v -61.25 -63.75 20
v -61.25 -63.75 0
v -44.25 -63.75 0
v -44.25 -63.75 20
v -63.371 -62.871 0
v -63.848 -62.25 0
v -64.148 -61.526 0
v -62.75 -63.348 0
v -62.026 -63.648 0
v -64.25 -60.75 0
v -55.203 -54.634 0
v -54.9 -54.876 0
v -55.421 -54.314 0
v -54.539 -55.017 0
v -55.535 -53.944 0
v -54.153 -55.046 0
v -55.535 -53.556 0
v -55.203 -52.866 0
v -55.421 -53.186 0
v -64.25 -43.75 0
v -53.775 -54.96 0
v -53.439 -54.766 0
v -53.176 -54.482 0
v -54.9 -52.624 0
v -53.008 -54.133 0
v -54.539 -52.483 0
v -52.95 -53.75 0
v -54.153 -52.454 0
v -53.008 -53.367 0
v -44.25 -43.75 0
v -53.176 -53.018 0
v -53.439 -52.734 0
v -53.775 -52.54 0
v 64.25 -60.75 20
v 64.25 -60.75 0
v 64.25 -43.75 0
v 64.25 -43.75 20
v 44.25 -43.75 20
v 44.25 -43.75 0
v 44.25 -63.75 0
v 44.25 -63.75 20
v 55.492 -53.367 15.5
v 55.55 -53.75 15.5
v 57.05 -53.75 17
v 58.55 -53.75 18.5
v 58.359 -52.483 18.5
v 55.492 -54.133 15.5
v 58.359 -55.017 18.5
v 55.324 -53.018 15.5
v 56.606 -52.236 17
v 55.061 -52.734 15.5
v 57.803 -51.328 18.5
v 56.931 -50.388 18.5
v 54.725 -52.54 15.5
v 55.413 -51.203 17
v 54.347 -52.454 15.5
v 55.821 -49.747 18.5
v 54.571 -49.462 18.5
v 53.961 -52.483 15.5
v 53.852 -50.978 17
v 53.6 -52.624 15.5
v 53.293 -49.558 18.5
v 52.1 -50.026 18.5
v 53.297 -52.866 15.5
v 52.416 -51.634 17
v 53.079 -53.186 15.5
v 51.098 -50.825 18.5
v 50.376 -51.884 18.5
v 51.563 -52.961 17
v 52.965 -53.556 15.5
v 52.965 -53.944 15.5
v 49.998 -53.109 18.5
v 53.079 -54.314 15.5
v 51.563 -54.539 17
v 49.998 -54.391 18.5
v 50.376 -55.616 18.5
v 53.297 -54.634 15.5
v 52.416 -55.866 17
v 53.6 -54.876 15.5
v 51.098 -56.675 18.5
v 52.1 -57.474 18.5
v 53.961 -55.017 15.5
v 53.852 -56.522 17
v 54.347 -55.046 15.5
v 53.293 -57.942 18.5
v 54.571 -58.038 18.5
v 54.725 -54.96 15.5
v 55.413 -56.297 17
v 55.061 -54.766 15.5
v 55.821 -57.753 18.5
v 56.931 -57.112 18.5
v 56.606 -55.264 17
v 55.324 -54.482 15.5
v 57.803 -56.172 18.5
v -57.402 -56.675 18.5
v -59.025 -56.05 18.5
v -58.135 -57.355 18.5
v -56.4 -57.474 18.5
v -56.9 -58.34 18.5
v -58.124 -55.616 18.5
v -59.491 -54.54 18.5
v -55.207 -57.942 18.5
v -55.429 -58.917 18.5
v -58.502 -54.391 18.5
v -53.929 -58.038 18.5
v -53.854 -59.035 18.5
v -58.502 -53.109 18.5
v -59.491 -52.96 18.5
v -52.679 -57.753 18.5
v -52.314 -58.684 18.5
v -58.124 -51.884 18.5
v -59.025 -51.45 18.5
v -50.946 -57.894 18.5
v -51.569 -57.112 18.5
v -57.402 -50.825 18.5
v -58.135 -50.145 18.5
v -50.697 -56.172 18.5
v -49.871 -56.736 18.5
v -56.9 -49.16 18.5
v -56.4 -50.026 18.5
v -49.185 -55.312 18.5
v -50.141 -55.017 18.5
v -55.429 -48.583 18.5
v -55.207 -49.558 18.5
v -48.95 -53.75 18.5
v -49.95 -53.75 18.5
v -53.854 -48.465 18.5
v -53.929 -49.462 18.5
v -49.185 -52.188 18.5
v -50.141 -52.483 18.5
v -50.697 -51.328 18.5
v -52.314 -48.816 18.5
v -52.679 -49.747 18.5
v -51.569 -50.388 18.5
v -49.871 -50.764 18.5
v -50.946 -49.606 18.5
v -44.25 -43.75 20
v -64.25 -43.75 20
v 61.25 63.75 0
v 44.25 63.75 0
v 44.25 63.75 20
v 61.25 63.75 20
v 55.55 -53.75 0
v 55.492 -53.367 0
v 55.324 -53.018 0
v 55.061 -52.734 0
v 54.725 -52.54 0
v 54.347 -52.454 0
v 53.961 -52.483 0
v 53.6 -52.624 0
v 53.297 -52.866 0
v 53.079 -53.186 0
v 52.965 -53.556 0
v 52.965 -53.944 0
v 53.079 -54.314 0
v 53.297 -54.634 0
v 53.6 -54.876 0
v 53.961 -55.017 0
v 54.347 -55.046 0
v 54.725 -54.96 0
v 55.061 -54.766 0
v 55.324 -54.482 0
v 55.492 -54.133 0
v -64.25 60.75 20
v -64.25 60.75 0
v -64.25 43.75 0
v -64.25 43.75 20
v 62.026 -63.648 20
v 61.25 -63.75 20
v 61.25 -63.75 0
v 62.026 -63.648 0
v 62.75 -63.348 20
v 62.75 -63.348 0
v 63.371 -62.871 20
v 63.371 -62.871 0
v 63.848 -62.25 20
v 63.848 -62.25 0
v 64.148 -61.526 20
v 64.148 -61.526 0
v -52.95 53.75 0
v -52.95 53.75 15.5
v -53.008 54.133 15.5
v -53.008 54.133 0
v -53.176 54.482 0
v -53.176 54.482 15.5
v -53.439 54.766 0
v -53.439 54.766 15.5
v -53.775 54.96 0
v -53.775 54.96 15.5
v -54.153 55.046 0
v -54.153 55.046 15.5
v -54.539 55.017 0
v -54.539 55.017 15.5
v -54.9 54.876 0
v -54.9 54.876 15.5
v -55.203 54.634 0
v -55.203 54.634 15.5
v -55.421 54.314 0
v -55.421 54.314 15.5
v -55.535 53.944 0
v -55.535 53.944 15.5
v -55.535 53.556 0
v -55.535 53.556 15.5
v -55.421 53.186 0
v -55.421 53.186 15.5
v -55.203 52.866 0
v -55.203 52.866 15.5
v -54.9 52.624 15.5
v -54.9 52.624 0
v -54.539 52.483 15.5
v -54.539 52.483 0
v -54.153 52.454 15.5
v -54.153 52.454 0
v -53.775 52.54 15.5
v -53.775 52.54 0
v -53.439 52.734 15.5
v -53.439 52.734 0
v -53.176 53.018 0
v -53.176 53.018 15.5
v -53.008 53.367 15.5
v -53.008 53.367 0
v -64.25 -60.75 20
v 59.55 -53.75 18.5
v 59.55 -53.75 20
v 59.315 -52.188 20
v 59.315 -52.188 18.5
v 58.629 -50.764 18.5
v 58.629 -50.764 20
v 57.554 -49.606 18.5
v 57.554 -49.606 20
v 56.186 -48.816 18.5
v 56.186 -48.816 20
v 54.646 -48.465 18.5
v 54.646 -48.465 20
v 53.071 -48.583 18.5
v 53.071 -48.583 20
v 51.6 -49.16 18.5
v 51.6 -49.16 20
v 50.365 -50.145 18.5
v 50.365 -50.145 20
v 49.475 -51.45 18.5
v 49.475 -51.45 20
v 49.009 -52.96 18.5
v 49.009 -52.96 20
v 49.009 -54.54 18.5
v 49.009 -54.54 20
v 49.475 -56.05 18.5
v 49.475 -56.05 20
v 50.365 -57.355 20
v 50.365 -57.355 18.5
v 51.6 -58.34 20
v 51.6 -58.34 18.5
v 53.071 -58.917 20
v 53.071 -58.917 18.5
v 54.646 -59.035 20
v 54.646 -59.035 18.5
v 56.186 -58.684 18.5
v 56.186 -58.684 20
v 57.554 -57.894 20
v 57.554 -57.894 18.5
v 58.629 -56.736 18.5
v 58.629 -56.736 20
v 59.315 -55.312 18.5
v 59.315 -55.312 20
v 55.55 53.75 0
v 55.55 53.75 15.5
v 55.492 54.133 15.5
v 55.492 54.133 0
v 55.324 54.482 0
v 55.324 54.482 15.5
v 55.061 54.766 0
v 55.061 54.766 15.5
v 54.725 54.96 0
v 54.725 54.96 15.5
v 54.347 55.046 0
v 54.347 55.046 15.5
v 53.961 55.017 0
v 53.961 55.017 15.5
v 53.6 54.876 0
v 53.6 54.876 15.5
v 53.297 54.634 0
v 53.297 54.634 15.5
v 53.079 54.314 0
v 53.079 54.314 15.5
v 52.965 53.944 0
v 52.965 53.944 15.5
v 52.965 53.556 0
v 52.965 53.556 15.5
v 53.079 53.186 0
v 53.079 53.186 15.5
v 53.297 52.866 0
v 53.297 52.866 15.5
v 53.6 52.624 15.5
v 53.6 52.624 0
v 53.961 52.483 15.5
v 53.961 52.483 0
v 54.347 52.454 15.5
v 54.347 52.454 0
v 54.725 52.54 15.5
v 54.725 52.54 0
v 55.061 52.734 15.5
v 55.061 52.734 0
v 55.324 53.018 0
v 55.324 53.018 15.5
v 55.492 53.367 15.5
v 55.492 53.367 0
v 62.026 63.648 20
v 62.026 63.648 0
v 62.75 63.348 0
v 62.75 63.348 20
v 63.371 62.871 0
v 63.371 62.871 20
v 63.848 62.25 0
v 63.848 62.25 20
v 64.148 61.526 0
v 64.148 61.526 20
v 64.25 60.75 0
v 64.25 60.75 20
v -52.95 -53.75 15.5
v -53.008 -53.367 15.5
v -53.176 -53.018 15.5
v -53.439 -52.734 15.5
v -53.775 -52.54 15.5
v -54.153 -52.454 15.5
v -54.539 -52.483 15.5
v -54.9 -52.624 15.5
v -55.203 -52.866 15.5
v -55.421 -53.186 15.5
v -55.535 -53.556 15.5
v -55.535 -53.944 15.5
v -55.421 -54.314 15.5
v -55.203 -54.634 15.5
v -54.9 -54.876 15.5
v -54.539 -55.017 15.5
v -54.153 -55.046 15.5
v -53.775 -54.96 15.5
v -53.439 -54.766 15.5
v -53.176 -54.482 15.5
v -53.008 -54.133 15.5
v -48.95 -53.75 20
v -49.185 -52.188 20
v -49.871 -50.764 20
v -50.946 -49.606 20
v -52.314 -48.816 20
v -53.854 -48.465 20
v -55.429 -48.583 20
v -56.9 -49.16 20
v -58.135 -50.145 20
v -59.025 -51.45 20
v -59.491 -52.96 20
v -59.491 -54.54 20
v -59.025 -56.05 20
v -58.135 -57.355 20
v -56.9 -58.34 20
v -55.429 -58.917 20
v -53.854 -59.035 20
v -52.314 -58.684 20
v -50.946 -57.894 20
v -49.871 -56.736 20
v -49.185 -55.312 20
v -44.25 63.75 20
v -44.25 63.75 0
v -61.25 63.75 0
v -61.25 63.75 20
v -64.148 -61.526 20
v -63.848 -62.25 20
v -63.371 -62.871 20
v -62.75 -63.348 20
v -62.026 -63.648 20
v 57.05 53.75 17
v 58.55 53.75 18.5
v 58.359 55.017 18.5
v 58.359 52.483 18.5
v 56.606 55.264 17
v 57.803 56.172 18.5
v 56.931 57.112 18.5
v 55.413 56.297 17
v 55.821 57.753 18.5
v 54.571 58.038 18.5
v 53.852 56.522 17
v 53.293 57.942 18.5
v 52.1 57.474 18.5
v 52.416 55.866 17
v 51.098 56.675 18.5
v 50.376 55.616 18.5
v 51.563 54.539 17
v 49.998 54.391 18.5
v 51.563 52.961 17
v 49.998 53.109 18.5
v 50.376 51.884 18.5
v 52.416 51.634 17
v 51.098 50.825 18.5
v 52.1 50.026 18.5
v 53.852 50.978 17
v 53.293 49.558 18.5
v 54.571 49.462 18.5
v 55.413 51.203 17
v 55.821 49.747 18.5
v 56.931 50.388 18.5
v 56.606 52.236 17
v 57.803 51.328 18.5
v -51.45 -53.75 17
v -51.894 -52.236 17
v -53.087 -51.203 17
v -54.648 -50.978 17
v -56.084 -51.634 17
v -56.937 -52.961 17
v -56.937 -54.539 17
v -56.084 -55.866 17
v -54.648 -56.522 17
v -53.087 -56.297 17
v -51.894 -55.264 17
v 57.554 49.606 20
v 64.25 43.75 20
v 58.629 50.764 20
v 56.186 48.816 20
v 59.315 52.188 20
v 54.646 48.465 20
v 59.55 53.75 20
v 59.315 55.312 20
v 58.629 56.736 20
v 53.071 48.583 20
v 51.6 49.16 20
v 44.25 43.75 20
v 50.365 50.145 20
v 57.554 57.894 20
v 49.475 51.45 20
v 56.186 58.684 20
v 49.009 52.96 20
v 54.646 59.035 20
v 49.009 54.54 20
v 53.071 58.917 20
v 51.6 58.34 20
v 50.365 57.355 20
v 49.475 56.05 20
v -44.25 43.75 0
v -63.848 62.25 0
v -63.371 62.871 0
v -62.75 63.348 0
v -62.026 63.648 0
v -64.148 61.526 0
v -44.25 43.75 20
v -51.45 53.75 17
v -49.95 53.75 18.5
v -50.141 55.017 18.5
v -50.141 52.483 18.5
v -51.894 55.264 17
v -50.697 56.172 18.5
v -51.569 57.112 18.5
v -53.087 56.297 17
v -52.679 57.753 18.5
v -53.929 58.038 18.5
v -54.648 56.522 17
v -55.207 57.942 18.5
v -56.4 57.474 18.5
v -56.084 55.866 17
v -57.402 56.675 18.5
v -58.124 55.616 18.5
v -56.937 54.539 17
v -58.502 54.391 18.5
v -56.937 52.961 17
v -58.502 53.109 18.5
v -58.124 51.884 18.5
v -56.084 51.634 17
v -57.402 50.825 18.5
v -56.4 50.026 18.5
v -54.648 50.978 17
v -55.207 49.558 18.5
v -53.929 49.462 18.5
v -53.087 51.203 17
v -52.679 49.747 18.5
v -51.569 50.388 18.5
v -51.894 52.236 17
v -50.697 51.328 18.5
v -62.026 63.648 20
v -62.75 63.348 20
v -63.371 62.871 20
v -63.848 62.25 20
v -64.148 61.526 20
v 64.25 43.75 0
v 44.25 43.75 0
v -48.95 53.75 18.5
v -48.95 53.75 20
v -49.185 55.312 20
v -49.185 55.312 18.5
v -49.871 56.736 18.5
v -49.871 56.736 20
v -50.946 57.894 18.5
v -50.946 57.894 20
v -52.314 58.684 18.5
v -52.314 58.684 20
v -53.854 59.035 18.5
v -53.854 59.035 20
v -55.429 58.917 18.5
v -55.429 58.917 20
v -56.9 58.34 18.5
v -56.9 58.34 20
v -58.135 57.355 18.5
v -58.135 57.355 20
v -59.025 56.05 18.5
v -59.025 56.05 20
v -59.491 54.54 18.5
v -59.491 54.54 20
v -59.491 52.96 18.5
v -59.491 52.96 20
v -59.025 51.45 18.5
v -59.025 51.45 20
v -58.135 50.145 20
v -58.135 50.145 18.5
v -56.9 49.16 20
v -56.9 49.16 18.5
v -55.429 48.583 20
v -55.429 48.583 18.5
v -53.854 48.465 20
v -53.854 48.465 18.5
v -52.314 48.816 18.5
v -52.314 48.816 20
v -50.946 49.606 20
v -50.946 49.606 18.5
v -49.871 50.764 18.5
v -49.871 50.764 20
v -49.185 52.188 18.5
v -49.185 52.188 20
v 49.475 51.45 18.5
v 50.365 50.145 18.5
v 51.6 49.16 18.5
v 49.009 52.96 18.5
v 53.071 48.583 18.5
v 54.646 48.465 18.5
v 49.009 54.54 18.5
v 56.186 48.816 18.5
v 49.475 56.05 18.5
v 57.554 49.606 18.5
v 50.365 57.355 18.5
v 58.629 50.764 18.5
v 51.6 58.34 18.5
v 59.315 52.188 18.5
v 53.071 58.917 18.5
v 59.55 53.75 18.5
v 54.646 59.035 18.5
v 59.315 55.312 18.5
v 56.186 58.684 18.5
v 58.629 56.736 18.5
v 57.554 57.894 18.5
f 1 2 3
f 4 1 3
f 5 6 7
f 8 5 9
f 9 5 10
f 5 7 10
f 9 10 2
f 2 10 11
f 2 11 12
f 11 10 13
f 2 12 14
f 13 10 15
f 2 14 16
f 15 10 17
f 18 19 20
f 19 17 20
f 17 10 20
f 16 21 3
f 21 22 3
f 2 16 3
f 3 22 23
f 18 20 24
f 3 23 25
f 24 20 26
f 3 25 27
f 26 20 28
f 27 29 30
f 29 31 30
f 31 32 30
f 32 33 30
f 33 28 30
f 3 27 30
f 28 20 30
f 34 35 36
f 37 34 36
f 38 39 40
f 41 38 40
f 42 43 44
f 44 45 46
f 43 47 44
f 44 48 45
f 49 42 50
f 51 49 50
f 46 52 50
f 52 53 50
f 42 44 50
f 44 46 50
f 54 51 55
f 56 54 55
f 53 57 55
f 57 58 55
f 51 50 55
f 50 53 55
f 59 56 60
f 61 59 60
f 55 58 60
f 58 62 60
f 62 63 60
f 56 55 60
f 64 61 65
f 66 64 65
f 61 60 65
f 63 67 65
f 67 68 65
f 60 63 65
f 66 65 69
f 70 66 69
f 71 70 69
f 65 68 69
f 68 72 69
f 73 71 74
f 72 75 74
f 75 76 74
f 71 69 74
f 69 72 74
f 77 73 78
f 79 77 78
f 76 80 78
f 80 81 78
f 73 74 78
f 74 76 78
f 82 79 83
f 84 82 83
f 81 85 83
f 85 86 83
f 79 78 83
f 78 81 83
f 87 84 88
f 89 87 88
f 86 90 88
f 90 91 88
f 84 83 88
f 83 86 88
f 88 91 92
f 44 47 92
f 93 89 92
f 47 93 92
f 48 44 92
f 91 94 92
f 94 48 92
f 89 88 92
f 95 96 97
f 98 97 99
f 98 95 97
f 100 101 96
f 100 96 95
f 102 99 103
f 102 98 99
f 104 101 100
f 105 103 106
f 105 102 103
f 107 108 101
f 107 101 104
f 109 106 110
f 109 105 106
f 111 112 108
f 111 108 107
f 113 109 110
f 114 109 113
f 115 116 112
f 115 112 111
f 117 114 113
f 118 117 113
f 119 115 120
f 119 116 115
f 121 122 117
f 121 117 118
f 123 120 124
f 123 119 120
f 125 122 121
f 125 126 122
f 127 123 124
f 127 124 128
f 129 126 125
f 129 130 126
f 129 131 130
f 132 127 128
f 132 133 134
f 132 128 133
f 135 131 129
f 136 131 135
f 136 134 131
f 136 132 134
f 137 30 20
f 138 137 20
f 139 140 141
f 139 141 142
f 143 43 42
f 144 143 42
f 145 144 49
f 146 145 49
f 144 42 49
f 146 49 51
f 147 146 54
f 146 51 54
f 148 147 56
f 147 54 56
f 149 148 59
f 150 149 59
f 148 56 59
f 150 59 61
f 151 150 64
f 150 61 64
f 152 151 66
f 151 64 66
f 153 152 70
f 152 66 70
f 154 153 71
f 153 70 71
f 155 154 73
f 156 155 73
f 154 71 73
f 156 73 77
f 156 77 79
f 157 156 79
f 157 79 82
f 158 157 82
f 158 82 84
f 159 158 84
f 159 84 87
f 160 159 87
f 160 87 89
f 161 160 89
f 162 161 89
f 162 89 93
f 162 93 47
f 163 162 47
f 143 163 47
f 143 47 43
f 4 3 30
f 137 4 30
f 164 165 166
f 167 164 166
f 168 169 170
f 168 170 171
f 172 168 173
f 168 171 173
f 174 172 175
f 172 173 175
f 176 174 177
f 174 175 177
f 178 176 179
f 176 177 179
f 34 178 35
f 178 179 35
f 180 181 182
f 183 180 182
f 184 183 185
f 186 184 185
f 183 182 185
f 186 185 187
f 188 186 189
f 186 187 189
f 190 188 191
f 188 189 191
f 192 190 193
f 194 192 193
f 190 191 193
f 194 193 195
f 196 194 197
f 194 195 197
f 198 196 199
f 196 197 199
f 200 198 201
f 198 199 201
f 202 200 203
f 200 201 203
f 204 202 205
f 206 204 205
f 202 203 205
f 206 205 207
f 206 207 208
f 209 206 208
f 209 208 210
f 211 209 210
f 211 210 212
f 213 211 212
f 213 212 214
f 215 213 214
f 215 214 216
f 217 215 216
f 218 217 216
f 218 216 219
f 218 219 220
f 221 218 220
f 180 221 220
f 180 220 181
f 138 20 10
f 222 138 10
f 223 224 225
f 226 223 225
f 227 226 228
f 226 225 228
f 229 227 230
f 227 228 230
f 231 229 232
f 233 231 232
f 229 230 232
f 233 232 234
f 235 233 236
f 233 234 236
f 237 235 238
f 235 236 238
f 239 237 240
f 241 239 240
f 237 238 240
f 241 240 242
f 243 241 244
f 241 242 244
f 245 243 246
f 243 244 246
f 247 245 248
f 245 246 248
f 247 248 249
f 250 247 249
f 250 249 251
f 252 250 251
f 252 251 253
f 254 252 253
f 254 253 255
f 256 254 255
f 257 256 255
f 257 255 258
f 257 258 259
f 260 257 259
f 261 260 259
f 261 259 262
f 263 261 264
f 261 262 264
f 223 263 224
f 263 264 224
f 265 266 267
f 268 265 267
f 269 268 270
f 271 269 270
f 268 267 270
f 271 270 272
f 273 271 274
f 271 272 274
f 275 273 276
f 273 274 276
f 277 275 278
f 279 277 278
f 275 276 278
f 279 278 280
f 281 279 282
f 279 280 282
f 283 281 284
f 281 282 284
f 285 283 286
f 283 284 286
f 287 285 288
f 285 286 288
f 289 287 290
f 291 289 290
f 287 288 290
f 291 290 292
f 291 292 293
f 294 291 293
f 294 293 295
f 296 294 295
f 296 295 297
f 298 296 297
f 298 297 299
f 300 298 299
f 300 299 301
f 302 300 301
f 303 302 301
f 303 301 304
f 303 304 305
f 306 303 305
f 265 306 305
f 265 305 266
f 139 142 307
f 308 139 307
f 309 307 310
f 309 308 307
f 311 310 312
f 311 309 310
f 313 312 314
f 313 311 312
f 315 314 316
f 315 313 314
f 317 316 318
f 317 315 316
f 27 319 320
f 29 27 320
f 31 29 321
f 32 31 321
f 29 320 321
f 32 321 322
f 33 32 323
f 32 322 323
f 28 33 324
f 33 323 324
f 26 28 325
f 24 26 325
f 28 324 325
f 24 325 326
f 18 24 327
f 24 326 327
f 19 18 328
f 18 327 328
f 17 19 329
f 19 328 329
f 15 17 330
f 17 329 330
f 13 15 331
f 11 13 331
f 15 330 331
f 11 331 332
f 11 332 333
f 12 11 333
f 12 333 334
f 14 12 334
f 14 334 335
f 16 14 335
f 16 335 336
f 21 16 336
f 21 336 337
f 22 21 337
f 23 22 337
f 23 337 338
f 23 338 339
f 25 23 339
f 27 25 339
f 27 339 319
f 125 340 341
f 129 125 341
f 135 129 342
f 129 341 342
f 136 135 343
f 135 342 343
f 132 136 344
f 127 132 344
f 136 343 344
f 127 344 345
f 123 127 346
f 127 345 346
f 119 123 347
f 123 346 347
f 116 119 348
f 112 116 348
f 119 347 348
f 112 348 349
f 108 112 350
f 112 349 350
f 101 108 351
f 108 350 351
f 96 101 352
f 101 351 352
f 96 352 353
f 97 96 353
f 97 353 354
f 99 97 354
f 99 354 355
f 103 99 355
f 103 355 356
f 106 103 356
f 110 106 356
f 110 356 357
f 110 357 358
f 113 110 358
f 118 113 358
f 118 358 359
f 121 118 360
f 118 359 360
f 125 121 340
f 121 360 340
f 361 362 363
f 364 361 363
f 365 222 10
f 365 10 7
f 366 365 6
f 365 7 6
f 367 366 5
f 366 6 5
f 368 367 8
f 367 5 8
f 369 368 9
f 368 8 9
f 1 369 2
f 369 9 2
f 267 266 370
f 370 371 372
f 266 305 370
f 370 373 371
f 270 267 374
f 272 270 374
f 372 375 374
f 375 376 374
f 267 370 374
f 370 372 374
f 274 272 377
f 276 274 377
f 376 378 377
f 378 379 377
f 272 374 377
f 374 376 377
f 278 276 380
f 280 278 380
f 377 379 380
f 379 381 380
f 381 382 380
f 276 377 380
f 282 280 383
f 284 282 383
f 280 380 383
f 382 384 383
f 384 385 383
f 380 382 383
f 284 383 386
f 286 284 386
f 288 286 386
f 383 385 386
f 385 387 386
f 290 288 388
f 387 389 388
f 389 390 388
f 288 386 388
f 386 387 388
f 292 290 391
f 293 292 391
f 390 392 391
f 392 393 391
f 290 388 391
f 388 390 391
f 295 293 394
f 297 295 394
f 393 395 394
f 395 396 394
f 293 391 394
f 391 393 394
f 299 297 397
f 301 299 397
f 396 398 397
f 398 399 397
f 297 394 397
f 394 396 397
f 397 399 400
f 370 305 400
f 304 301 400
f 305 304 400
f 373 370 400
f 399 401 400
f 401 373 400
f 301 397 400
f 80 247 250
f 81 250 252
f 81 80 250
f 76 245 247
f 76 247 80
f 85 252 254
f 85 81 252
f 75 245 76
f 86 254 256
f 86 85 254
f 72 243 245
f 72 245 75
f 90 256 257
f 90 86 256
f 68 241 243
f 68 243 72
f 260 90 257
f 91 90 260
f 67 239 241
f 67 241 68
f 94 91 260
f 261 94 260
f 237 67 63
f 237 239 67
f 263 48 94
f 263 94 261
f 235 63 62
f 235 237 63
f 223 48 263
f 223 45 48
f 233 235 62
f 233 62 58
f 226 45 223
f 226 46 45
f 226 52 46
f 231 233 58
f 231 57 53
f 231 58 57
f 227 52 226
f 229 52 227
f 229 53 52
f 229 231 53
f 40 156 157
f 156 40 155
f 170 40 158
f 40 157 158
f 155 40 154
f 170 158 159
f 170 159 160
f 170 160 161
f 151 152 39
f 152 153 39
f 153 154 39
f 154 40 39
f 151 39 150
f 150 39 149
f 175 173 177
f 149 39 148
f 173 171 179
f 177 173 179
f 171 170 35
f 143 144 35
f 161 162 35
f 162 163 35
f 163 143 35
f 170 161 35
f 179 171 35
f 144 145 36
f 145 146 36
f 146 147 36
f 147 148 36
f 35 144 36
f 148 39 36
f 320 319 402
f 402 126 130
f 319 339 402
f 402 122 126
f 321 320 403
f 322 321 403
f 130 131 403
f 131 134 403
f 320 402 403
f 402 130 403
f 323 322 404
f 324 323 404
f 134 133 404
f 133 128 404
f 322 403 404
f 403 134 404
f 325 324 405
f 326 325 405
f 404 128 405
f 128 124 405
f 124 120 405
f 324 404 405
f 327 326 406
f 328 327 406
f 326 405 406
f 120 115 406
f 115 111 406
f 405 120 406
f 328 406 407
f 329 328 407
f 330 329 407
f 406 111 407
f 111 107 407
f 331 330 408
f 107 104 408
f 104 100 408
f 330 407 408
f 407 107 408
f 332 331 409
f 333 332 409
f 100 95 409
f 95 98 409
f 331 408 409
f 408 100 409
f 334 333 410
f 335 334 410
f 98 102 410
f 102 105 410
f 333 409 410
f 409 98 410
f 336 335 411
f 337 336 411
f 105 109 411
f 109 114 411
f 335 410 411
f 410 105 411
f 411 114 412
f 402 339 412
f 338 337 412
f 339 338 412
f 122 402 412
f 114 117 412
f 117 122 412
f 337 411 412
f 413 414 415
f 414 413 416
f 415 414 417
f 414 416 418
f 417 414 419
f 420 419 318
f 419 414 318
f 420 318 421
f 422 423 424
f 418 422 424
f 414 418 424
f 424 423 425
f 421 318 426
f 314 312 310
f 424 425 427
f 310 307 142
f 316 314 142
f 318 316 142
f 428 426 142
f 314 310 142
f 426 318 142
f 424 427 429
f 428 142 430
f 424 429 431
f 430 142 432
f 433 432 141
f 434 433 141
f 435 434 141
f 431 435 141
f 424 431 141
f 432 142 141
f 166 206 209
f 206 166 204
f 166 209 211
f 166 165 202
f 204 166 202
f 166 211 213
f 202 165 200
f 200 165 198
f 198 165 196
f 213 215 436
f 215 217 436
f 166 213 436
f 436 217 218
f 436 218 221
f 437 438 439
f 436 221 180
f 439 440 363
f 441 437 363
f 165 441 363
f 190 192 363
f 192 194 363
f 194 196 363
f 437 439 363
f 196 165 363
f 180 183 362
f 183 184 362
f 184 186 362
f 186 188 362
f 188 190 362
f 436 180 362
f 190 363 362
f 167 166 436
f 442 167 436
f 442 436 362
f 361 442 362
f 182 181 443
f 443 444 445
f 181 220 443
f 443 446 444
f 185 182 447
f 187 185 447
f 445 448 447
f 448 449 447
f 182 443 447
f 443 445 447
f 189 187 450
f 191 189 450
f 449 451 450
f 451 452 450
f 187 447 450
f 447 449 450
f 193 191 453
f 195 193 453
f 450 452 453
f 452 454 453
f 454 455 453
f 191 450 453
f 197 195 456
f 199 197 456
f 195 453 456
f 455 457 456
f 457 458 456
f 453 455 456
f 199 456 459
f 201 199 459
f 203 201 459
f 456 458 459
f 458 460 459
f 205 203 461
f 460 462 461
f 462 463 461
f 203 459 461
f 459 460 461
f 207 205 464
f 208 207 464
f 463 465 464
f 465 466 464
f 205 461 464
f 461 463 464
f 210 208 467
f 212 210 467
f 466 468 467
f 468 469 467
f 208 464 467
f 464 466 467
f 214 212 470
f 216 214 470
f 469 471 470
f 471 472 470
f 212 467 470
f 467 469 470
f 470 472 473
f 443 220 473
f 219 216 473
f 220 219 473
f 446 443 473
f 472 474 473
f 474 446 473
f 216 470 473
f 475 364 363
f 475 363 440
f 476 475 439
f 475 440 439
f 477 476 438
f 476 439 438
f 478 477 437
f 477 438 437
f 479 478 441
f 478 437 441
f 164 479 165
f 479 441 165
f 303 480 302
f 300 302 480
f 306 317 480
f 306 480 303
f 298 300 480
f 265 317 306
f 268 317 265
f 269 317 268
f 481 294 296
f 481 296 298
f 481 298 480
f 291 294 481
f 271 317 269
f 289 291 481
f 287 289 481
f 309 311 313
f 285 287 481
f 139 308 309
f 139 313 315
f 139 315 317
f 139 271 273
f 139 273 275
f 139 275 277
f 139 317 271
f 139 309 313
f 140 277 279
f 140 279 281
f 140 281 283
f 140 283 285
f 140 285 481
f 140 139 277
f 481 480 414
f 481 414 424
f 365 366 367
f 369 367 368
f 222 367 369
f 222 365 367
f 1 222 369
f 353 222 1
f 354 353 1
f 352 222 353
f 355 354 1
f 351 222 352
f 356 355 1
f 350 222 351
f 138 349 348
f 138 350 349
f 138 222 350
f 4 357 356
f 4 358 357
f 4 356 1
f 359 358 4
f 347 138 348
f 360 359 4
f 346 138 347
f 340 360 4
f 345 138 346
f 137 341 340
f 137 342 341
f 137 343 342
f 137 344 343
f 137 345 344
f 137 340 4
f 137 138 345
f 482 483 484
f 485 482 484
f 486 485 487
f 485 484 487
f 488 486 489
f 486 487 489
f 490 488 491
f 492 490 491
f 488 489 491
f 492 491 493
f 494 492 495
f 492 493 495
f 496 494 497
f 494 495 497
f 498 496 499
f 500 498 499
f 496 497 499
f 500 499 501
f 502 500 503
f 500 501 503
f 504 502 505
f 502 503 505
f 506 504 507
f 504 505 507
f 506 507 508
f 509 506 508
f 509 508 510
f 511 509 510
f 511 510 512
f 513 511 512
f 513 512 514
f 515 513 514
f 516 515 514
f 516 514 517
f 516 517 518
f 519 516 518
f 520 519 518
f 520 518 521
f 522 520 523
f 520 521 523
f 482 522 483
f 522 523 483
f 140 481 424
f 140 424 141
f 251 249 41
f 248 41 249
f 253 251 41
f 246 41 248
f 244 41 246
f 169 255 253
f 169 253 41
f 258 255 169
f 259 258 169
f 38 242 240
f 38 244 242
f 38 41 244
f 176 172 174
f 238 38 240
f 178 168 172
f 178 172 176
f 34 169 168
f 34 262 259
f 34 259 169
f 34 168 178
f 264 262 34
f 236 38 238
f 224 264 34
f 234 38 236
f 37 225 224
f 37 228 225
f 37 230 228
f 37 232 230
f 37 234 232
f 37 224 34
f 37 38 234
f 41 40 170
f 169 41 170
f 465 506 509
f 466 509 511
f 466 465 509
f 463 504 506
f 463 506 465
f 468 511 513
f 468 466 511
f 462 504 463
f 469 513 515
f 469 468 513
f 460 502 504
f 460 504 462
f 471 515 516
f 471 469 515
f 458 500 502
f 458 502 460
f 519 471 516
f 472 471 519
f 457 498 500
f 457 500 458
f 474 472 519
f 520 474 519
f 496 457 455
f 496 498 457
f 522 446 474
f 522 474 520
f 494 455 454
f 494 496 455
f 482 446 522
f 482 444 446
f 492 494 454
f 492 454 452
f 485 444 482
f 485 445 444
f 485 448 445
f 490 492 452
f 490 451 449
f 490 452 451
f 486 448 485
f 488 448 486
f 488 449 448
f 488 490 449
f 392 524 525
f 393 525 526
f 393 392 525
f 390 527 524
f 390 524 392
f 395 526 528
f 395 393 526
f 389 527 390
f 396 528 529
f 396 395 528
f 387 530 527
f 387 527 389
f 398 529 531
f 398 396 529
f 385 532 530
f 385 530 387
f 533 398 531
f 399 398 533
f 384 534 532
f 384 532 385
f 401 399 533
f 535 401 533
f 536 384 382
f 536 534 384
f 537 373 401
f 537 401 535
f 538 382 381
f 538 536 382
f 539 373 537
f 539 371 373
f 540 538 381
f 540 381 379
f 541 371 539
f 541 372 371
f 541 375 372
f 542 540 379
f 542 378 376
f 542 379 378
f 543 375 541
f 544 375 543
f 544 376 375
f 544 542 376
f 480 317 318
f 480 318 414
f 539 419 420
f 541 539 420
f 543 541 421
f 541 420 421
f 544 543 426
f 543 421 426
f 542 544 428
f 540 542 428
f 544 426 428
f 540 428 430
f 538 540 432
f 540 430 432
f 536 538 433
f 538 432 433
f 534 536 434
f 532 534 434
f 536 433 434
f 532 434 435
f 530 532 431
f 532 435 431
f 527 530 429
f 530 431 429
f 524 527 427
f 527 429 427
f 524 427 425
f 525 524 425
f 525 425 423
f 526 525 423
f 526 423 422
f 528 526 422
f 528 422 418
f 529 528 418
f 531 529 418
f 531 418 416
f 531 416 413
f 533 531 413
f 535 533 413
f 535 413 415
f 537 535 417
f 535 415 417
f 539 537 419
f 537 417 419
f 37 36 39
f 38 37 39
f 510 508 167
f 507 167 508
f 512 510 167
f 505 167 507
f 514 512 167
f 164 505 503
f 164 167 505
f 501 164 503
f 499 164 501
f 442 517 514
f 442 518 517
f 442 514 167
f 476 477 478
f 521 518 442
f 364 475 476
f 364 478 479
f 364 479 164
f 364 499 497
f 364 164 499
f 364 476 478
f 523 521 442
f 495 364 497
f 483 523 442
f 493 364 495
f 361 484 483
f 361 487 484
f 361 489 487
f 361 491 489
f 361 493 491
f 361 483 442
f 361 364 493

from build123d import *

# Parameters (mm, degrees)
EXTRUDE_1_DEPTH     = 20
EXTRUDE_1_2_DEPTH   = 20
EXTRUDE_1_3_DEPTH   = 20
EXTRUDE_1_4_DEPTH   = 20
SKETCH_2_R          = 1.3
CUT_EXTRUDE_1_DEPTH = 21
SKETCH_3_R          = 5.3
CUT_EXTRUDE_2_DEPTH = 1.5
CHAMFER_1_SIZE      = 3
CHAMFER_2_SIZE      = 3
CHAMFER_3_SIZE      = 3
CHAMFER_4_SIZE      = 3


with BuildPart() as part:
    # Эскиз1 → Бобышка-Вытянуть1 (new body)
    with BuildSketch(Plane.XY):
        with BuildLine():
            Line((-44.25, -43.75), (-64.25, -43.75))
            Line((-64.25, -43.75), (-64.25, -60.75))
            ThreePointArc((-64.25, -60.75), (-63.371320344, -62.871320344), (-61.25, -63.75))
            Line((-61.25, -63.75), (-44.25, -63.75))
            Line((-44.25, -63.75), (-44.25, -43.75))
        make_face()
    extrude(amount=EXTRUDE_1_DEPTH)


with BuildPart() as body_2:
    # Эскиз1 → Extrude 1 2 (new body)
    with BuildSketch(Plane.XY):
        with BuildLine():
            Line((44.25, -43.75), (44.25, -63.75))
            Line((44.25, -63.75), (61.25, -63.75))
            ThreePointArc((61.25, -63.75), (63.371320344, -62.871320344), (64.25, -60.75))
            Line((64.25, -60.75), (64.25, -43.75))
            Line((64.25, -43.75), (44.25, -43.75))
        make_face()
    extrude(amount=EXTRUDE_1_2_DEPTH)


with BuildPart() as body_3:
    # Эскиз1 → Extrude 1 3 (new body)
    with BuildSketch(Plane.XY):
        with BuildLine():
            Line((44.25, 43.75), (44.25, 63.75))
            Line((44.25, 63.75), (61.25, 63.75))
            ThreePointArc((61.25, 63.75), (63.371320344, 62.871320344), (64.25, 60.75))
            Line((64.25, 60.75), (64.25, 43.75))
            Line((64.25, 43.75), (44.25, 43.75))
        make_face()
    extrude(amount=EXTRUDE_1_3_DEPTH)


with BuildPart() as body_4:
    # Эскиз1 → Extrude 1 4 (new body)
    with BuildSketch(Plane.XY):
        with BuildLine():
            Line((-64.25, 60.75), (-64.25, 43.75))
            Line((-64.25, 43.75), (-44.25, 43.75))
            Line((-44.25, 43.75), (-44.25, 63.75))
            Line((-44.25, 63.75), (-61.25, 63.75))
            ThreePointArc((-61.25, 63.75), (-63.371320344, 62.871320344), (-64.25, 60.75))
        make_face()
    extrude(amount=EXTRUDE_1_4_DEPTH)


with BuildPart() as cut_extrude_1_tool:
    # Эскиз2 → Вырез-Вытянуть1 (new body)
    with BuildSketch(Plane.XY.offset(20)):
        with Locations((54.25, 53.75)):
            Circle(SKETCH_2_R)
        with Locations((-54.25, 53.75)):
            Circle(SKETCH_2_R)
        with Locations((-54.25, -53.75)):
            Circle(SKETCH_2_R)
        with Locations((54.25, -53.75)):
            Circle(SKETCH_2_R)
    extrude(amount=-CUT_EXTRUDE_1_DEPTH)


with BuildPart() as part_1:
    add(part.part)

    # Вырез-Вытянуть1: cut by cut_extrude_1_tool
    add(cut_extrude_1_tool.part, mode=Mode.SUBTRACT)


with BuildPart() as body_2_1:
    add(body_2.part)

    # Вырез-Вытянуть1: cut by cut_extrude_1_tool
    add(cut_extrude_1_tool.part, mode=Mode.SUBTRACT)


with BuildPart() as body_3_1:
    add(body_3.part)

    # Вырез-Вытянуть1: cut by cut_extrude_1_tool
    add(cut_extrude_1_tool.part, mode=Mode.SUBTRACT)


with BuildPart() as body_4_1:
    add(body_4.part)

    # Вырез-Вытянуть1: cut by cut_extrude_1_tool
    add(cut_extrude_1_tool.part, mode=Mode.SUBTRACT)


with BuildPart() as cut_extrude_2_tool:
    # Эскиз3 → Вырез-Вытянуть2 (new body)
    with BuildSketch(Plane.XY.offset(20)):
        with Locations((-54.25, 53.75)):
            Circle(SKETCH_3_R)
        with Locations((54.25, 53.75)):
            Circle(SKETCH_3_R)
        with Locations((54.25, -53.75)):
            Circle(SKETCH_3_R)
        with Locations((-54.25, -53.75)):
            Circle(SKETCH_3_R)
    extrude(amount=-CUT_EXTRUDE_2_DEPTH)


with BuildPart() as part_2:
    add(part_1.part)

    # Вырез-Вытянуть2: cut by cut_extrude_2_tool
    add(cut_extrude_2_tool.part, mode=Mode.SUBTRACT)

    # Фаска2
    chamfer_2_edges = [part_2.edges().sort_by_distance(p)[0] for p in [
        (-55.55, -53.75, 18.5),
    ]]
    chamfer(chamfer_2_edges, length=CHAMFER_2_SIZE)


with BuildPart() as body_2_2:
    add(body_2_1.part)

    # Вырез-Вытянуть2: cut by cut_extrude_2_tool
    add(cut_extrude_2_tool.part, mode=Mode.SUBTRACT)

    # Фаска4
    chamfer_4_edges = [body_2_2.edges().sort_by_distance(p)[0] for p in [
        (52.95, -53.75, 18.5),
    ]]
    chamfer(chamfer_4_edges, length=CHAMFER_4_SIZE)


with BuildPart() as body_3_2:
    add(body_3_1.part)

    # Вырез-Вытянуть2: cut by cut_extrude_2_tool
    add(cut_extrude_2_tool.part, mode=Mode.SUBTRACT)

    # Фаска3
    chamfer_3_edges = [body_3_2.edges().sort_by_distance(p)[0] for p in [
        (52.95, 53.75, 18.5),
    ]]
    chamfer(chamfer_3_edges, length=CHAMFER_3_SIZE)


with BuildPart() as body_4_2:
    add(body_4_1.part)

    # Вырез-Вытянуть2: cut by cut_extrude_2_tool
    add(cut_extrude_2_tool.part, mode=Mode.SUBTRACT)

    # Фаска1
    chamfer_1_edges = [body_4_2.edges().sort_by_distance(p)[0] for p in [
        (-55.55, 53.75, 18.5),
    ]]
    chamfer(chamfer_1_edges, length=CHAMFER_1_SIZE)


solid = Compound([part_2.part, body_2_2.part, body_3_2.part, body_4_2.part])
